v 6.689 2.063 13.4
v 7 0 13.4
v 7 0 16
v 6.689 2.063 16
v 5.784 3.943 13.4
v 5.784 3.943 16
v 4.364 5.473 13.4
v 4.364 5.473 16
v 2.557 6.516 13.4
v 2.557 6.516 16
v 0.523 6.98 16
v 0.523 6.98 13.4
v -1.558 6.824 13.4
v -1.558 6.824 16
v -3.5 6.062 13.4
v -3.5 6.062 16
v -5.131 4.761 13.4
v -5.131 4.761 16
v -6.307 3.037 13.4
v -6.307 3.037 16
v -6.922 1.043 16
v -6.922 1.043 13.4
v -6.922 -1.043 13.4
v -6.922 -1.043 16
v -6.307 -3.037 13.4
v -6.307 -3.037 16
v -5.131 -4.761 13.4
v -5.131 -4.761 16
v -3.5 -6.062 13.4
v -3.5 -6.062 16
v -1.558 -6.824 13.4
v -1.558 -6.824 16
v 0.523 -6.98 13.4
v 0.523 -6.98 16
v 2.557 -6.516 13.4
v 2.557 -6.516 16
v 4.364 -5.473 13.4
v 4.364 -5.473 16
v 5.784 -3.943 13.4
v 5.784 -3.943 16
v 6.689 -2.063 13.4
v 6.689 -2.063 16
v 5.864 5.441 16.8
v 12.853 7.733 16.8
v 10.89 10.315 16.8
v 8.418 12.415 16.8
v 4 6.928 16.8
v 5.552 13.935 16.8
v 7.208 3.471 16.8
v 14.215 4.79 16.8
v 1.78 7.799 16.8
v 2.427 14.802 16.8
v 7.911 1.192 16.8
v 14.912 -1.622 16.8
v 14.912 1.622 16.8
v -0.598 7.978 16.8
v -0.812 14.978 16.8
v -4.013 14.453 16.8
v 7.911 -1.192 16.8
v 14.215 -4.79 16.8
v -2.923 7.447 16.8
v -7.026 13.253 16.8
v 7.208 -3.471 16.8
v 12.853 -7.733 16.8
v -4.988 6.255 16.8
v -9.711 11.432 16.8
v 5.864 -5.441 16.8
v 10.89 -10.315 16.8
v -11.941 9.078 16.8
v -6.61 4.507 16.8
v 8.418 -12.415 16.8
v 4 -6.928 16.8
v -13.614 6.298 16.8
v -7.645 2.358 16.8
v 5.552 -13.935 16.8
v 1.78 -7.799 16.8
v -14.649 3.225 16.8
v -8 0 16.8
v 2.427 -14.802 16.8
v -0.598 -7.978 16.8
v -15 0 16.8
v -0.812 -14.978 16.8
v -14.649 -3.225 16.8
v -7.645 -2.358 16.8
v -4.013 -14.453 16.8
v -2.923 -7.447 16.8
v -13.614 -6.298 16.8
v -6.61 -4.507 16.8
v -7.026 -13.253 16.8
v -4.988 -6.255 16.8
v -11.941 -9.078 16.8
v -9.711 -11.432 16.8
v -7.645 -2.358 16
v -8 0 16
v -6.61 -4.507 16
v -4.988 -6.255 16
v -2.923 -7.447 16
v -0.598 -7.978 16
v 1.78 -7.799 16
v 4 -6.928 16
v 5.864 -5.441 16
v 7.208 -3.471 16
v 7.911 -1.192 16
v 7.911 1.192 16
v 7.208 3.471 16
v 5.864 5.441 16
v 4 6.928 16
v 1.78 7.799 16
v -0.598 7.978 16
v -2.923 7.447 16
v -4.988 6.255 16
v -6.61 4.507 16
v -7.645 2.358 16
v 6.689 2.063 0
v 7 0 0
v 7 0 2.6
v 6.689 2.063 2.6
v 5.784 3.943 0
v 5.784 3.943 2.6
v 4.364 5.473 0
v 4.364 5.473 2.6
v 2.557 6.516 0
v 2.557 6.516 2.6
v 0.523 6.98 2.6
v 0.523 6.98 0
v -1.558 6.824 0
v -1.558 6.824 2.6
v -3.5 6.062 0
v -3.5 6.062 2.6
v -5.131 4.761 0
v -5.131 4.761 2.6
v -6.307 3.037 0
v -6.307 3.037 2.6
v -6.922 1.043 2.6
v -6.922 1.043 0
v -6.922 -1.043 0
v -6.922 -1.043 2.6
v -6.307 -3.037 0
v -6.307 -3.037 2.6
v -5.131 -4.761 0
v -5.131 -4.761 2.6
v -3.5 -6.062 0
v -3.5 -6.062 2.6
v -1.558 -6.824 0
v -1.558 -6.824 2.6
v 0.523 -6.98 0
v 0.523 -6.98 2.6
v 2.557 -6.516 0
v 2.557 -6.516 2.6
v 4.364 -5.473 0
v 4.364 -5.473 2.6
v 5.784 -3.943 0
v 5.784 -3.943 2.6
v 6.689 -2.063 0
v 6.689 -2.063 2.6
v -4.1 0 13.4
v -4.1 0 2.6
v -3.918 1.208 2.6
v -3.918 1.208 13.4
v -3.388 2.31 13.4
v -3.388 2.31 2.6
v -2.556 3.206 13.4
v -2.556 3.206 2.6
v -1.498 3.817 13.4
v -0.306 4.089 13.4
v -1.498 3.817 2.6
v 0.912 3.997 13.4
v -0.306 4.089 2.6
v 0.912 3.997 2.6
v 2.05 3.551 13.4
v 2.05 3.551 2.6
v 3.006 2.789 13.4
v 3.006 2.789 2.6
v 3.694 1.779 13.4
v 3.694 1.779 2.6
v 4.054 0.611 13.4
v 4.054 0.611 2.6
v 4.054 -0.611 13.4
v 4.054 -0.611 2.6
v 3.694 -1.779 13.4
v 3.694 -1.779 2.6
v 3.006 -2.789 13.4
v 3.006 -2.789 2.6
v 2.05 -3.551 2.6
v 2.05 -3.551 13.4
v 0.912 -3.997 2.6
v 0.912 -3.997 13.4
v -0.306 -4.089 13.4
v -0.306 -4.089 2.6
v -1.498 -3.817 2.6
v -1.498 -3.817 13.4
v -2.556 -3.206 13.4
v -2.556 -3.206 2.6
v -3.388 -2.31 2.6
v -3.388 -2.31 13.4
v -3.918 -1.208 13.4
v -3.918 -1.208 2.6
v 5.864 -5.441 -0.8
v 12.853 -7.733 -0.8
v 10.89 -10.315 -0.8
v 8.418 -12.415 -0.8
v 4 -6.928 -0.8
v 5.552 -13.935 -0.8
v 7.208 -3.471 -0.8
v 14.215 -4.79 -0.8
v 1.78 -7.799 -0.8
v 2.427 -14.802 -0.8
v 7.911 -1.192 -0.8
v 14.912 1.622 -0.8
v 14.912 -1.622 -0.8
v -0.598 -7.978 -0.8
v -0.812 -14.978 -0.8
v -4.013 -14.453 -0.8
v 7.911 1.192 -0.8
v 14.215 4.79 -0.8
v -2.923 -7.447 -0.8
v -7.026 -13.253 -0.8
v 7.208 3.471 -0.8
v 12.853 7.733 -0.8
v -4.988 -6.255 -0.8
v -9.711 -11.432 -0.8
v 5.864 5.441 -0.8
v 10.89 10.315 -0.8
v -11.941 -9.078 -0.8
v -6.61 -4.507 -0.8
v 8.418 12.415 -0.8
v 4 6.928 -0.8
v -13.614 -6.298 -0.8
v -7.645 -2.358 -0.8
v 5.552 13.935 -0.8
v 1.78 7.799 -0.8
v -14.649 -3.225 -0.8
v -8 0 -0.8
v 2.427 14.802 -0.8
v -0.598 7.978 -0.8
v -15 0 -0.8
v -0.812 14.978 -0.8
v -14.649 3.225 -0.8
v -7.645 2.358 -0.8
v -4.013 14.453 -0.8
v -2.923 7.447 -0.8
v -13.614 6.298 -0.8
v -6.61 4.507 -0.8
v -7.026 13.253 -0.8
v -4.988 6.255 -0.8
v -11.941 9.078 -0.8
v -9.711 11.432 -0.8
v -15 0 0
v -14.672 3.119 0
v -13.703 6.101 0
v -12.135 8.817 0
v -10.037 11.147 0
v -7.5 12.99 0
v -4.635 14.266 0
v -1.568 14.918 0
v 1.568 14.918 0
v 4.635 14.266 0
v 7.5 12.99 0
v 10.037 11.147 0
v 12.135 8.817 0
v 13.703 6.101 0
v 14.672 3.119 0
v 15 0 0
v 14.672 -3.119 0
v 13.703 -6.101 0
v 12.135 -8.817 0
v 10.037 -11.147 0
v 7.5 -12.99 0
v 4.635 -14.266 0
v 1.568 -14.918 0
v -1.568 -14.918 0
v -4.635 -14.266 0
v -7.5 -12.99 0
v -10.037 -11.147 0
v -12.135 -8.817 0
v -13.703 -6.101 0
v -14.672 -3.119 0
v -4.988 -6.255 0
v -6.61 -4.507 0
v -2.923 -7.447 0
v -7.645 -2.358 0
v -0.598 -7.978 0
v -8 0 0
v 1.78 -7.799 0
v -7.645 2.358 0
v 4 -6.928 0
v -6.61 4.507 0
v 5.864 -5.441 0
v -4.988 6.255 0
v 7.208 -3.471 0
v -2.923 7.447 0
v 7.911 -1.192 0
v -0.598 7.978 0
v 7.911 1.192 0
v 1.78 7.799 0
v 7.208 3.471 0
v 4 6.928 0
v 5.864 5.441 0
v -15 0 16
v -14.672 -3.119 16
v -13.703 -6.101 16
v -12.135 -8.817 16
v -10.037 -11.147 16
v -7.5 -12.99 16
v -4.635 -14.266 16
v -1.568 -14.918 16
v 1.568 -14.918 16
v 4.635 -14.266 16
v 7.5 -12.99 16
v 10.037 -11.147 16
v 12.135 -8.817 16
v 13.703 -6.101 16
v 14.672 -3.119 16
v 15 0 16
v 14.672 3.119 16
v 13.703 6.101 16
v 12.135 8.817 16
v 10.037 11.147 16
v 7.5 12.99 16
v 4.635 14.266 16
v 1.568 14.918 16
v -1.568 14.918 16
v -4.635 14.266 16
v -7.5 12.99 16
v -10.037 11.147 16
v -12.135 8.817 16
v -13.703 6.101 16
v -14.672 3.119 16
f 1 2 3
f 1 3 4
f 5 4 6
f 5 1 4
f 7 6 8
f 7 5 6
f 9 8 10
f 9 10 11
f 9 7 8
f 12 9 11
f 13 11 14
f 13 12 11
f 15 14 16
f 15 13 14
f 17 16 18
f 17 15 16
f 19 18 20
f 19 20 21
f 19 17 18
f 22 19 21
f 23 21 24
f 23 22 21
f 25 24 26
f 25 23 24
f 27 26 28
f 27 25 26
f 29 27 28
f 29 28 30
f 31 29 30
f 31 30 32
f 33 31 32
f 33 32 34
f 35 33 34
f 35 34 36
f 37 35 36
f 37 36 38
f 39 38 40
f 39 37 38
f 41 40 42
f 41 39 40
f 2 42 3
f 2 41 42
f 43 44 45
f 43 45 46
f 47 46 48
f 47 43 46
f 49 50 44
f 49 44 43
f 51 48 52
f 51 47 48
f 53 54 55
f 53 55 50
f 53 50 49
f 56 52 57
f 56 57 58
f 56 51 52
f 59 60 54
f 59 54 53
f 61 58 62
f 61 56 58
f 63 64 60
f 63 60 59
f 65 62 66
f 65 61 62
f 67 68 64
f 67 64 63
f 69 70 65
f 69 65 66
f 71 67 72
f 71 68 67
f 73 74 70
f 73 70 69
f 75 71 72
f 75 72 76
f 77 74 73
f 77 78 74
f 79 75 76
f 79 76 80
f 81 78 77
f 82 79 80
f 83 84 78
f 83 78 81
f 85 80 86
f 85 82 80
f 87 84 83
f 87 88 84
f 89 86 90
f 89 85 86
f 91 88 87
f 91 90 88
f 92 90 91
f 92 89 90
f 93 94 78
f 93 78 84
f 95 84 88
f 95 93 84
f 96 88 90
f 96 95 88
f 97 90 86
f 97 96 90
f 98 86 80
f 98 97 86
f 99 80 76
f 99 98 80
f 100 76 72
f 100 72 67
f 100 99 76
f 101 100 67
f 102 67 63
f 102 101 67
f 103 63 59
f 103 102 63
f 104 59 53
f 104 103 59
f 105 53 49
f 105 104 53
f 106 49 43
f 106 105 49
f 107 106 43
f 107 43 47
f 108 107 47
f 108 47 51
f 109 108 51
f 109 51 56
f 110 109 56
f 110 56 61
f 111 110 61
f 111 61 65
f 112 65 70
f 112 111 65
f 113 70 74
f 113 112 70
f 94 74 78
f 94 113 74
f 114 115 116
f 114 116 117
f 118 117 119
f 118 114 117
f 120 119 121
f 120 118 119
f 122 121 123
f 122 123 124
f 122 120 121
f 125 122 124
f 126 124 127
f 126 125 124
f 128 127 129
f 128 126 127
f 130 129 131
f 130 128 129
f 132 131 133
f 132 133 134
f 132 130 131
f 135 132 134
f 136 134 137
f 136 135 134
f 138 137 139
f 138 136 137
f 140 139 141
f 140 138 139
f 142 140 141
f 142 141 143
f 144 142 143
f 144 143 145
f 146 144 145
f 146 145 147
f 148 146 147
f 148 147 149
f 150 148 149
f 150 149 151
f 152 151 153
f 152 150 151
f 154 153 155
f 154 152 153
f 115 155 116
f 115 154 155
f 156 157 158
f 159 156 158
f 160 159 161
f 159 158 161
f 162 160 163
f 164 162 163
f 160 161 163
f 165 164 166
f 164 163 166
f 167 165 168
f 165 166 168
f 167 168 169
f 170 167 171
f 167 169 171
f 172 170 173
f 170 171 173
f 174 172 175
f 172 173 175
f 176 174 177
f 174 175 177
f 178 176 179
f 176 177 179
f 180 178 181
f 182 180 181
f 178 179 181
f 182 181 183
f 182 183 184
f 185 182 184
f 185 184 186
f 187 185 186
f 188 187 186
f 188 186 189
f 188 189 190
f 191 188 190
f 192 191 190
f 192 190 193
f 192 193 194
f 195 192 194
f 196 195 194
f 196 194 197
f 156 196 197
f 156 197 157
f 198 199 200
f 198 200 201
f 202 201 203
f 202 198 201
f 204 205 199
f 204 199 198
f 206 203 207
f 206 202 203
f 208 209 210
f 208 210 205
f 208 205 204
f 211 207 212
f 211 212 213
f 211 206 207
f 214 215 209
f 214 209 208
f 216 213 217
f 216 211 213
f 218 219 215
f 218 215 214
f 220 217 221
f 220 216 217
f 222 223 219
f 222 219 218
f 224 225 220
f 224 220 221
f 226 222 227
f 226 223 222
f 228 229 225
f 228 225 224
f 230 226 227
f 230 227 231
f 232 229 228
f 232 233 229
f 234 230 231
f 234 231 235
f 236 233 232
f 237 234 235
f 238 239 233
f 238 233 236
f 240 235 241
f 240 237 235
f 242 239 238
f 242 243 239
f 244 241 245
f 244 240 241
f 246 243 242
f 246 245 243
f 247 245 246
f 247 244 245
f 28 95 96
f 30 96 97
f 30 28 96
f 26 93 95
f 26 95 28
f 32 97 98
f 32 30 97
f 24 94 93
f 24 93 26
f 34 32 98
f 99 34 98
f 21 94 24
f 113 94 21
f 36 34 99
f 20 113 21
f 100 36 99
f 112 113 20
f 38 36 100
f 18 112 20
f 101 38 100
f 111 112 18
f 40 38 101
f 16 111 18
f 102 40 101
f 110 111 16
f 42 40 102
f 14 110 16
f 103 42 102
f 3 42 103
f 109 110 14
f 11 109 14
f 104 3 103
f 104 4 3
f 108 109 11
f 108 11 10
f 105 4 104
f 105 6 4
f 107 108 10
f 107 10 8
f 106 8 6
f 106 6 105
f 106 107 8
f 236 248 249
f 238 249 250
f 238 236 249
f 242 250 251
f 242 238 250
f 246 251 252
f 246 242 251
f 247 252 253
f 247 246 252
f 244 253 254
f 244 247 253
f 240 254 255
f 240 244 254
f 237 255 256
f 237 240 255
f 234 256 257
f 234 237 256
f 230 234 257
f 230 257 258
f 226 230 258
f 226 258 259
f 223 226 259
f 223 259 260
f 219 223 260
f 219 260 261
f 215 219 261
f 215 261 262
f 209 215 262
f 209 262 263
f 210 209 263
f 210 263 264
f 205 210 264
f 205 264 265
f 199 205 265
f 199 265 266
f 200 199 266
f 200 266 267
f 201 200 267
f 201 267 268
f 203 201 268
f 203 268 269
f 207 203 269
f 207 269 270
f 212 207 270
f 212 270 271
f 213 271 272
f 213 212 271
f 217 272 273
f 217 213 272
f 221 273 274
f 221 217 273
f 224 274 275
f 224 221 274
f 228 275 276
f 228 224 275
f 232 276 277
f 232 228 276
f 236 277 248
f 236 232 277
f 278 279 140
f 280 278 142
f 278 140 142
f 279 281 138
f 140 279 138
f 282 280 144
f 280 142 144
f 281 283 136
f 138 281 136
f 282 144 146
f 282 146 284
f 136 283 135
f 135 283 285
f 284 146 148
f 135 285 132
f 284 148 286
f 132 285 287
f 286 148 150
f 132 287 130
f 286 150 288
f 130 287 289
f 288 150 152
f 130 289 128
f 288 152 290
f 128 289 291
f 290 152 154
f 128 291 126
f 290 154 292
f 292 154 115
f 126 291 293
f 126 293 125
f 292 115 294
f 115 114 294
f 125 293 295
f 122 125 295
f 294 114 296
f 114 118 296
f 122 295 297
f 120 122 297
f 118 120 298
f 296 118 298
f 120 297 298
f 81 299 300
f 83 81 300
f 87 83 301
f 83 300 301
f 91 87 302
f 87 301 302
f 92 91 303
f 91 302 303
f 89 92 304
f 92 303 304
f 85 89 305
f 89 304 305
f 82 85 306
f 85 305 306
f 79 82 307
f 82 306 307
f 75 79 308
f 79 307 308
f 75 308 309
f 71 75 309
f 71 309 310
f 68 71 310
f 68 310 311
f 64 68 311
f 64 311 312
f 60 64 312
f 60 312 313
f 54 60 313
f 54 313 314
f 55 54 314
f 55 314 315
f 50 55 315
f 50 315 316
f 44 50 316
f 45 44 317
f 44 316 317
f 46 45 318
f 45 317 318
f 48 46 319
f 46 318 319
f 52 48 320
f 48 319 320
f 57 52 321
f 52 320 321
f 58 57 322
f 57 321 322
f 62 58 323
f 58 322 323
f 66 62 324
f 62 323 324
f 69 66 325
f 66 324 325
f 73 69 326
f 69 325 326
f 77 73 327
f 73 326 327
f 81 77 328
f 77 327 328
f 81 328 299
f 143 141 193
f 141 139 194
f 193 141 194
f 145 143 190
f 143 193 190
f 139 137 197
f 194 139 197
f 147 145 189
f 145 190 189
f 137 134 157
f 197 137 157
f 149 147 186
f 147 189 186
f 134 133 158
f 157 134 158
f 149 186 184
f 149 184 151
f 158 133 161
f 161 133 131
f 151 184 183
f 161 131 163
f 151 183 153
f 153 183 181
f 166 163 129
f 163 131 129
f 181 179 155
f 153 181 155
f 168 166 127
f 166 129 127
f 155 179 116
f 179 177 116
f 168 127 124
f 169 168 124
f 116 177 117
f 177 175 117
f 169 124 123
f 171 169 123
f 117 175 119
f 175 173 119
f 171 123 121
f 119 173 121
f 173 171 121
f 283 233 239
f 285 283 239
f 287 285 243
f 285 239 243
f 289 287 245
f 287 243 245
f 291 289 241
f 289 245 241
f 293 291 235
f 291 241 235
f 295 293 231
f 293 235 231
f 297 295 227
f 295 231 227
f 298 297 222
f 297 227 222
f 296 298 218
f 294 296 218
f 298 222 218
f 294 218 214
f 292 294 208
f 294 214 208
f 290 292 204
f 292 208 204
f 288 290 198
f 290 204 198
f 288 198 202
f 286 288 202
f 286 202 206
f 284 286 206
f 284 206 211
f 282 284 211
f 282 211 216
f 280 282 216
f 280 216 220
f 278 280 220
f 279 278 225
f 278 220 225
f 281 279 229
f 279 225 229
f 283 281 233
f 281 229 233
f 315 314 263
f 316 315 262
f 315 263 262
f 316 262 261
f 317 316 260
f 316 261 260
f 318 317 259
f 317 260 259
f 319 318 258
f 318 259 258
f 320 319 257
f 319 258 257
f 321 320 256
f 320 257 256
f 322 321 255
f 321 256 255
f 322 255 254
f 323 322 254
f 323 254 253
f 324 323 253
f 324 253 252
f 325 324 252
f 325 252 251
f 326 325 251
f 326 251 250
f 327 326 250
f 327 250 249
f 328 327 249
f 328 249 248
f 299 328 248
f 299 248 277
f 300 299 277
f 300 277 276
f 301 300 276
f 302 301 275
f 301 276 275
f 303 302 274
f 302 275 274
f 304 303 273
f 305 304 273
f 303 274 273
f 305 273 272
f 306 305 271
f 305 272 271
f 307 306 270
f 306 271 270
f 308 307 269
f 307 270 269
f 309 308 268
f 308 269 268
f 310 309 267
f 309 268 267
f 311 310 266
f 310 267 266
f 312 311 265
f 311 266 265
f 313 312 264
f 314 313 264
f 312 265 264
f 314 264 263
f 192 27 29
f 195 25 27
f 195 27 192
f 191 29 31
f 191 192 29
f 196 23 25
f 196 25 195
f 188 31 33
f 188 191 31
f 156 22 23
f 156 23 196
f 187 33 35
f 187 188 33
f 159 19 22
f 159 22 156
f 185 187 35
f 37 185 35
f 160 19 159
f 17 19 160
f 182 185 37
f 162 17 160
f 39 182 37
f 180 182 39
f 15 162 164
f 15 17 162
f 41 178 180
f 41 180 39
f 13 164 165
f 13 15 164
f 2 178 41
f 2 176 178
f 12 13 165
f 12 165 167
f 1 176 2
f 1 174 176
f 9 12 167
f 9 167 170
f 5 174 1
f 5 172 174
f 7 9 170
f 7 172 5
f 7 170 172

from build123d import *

# Parameters (mm, degrees)
SKETCH_1_R          = 15
SKETCH_1_R_2        = 7
EXTRUDE_1_DEPTH     = 2.6
SKETCH_2_R          = 15
SKETCH_2_R_2        = 4
EXTRUDE_2_DEPTH     = 10.8
SKETCH_3_R          = 15
SKETCH_3_R_2        = 7
EXTRUDE_3_DEPTH     = 2.6
EXTRUDE_START       = 0.8
SKETCH_4_R          = 15
SKETCH_4_R_2        = 8
EXTRUDE_4_DEPTH     = 0.8
SKETCH_5_R          = 15
SKETCH_5_R_2        = 8
EXTRUDE_5_DEPTH     = 0.8
SKETCH_6_R          = 4.1
CUT_EXTRUDE_1_DEPTH = 30


with BuildPart() as part:
    # 草图1 → 凸台-拉伸1 (new body)
    with BuildSketch(Plane.XY):
        Circle(SKETCH_1_R)
        Circle(SKETCH_1_R_2, mode=Mode.SUBTRACT)
    extrude(amount=EXTRUDE_1_DEPTH)

    # 草图2 → 凸台-拉伸2 (add)
    with BuildSketch(Plane.XY.offset(2.6)):
        Circle(SKETCH_2_R)
        Circle(SKETCH_2_R_2, mode=Mode.SUBTRACT)
    extrude(amount=EXTRUDE_2_DEPTH)

    # 草图3 → 凸台-拉伸3 (add)
    with BuildSketch(Plane.XY.offset(13.4)):
        Circle(SKETCH_3_R)
        Circle(SKETCH_3_R_2, mode=Mode.SUBTRACT)
    extrude(amount=EXTRUDE_3_DEPTH)

    # 草图4 → 凸台-拉伸4 (add)
    with BuildSketch(Plane(origin=(0, 0, 0), x_dir=(-1, 0, 0), z_dir=(0, 0, -1)).offset(EXTRUDE_START)):
        Circle(SKETCH_4_R)
        Circle(SKETCH_4_R_2, mode=Mode.SUBTRACT)
    extrude(amount=-EXTRUDE_4_DEPTH)

    # 草图5 → 凸台-拉伸5 (add)
    with BuildSketch(Plane.XY.offset(16)):
        Circle(SKETCH_5_R)
        Circle(SKETCH_5_R_2, mode=Mode.SUBTRACT)
    extrude(amount=EXTRUDE_5_DEPTH)

    # 草图6 → 切除-拉伸1 (cut)
    with BuildSketch(Plane(origin=(0, 0, 2.6), x_dir=(-1, 0, 0), z_dir=(0, 0, -1))):
        Circle(SKETCH_6_R)
    extrude(amount=-CUT_EXTRUDE_1_DEPTH, mode=Mode.SUBTRACT)


solid = part.part
